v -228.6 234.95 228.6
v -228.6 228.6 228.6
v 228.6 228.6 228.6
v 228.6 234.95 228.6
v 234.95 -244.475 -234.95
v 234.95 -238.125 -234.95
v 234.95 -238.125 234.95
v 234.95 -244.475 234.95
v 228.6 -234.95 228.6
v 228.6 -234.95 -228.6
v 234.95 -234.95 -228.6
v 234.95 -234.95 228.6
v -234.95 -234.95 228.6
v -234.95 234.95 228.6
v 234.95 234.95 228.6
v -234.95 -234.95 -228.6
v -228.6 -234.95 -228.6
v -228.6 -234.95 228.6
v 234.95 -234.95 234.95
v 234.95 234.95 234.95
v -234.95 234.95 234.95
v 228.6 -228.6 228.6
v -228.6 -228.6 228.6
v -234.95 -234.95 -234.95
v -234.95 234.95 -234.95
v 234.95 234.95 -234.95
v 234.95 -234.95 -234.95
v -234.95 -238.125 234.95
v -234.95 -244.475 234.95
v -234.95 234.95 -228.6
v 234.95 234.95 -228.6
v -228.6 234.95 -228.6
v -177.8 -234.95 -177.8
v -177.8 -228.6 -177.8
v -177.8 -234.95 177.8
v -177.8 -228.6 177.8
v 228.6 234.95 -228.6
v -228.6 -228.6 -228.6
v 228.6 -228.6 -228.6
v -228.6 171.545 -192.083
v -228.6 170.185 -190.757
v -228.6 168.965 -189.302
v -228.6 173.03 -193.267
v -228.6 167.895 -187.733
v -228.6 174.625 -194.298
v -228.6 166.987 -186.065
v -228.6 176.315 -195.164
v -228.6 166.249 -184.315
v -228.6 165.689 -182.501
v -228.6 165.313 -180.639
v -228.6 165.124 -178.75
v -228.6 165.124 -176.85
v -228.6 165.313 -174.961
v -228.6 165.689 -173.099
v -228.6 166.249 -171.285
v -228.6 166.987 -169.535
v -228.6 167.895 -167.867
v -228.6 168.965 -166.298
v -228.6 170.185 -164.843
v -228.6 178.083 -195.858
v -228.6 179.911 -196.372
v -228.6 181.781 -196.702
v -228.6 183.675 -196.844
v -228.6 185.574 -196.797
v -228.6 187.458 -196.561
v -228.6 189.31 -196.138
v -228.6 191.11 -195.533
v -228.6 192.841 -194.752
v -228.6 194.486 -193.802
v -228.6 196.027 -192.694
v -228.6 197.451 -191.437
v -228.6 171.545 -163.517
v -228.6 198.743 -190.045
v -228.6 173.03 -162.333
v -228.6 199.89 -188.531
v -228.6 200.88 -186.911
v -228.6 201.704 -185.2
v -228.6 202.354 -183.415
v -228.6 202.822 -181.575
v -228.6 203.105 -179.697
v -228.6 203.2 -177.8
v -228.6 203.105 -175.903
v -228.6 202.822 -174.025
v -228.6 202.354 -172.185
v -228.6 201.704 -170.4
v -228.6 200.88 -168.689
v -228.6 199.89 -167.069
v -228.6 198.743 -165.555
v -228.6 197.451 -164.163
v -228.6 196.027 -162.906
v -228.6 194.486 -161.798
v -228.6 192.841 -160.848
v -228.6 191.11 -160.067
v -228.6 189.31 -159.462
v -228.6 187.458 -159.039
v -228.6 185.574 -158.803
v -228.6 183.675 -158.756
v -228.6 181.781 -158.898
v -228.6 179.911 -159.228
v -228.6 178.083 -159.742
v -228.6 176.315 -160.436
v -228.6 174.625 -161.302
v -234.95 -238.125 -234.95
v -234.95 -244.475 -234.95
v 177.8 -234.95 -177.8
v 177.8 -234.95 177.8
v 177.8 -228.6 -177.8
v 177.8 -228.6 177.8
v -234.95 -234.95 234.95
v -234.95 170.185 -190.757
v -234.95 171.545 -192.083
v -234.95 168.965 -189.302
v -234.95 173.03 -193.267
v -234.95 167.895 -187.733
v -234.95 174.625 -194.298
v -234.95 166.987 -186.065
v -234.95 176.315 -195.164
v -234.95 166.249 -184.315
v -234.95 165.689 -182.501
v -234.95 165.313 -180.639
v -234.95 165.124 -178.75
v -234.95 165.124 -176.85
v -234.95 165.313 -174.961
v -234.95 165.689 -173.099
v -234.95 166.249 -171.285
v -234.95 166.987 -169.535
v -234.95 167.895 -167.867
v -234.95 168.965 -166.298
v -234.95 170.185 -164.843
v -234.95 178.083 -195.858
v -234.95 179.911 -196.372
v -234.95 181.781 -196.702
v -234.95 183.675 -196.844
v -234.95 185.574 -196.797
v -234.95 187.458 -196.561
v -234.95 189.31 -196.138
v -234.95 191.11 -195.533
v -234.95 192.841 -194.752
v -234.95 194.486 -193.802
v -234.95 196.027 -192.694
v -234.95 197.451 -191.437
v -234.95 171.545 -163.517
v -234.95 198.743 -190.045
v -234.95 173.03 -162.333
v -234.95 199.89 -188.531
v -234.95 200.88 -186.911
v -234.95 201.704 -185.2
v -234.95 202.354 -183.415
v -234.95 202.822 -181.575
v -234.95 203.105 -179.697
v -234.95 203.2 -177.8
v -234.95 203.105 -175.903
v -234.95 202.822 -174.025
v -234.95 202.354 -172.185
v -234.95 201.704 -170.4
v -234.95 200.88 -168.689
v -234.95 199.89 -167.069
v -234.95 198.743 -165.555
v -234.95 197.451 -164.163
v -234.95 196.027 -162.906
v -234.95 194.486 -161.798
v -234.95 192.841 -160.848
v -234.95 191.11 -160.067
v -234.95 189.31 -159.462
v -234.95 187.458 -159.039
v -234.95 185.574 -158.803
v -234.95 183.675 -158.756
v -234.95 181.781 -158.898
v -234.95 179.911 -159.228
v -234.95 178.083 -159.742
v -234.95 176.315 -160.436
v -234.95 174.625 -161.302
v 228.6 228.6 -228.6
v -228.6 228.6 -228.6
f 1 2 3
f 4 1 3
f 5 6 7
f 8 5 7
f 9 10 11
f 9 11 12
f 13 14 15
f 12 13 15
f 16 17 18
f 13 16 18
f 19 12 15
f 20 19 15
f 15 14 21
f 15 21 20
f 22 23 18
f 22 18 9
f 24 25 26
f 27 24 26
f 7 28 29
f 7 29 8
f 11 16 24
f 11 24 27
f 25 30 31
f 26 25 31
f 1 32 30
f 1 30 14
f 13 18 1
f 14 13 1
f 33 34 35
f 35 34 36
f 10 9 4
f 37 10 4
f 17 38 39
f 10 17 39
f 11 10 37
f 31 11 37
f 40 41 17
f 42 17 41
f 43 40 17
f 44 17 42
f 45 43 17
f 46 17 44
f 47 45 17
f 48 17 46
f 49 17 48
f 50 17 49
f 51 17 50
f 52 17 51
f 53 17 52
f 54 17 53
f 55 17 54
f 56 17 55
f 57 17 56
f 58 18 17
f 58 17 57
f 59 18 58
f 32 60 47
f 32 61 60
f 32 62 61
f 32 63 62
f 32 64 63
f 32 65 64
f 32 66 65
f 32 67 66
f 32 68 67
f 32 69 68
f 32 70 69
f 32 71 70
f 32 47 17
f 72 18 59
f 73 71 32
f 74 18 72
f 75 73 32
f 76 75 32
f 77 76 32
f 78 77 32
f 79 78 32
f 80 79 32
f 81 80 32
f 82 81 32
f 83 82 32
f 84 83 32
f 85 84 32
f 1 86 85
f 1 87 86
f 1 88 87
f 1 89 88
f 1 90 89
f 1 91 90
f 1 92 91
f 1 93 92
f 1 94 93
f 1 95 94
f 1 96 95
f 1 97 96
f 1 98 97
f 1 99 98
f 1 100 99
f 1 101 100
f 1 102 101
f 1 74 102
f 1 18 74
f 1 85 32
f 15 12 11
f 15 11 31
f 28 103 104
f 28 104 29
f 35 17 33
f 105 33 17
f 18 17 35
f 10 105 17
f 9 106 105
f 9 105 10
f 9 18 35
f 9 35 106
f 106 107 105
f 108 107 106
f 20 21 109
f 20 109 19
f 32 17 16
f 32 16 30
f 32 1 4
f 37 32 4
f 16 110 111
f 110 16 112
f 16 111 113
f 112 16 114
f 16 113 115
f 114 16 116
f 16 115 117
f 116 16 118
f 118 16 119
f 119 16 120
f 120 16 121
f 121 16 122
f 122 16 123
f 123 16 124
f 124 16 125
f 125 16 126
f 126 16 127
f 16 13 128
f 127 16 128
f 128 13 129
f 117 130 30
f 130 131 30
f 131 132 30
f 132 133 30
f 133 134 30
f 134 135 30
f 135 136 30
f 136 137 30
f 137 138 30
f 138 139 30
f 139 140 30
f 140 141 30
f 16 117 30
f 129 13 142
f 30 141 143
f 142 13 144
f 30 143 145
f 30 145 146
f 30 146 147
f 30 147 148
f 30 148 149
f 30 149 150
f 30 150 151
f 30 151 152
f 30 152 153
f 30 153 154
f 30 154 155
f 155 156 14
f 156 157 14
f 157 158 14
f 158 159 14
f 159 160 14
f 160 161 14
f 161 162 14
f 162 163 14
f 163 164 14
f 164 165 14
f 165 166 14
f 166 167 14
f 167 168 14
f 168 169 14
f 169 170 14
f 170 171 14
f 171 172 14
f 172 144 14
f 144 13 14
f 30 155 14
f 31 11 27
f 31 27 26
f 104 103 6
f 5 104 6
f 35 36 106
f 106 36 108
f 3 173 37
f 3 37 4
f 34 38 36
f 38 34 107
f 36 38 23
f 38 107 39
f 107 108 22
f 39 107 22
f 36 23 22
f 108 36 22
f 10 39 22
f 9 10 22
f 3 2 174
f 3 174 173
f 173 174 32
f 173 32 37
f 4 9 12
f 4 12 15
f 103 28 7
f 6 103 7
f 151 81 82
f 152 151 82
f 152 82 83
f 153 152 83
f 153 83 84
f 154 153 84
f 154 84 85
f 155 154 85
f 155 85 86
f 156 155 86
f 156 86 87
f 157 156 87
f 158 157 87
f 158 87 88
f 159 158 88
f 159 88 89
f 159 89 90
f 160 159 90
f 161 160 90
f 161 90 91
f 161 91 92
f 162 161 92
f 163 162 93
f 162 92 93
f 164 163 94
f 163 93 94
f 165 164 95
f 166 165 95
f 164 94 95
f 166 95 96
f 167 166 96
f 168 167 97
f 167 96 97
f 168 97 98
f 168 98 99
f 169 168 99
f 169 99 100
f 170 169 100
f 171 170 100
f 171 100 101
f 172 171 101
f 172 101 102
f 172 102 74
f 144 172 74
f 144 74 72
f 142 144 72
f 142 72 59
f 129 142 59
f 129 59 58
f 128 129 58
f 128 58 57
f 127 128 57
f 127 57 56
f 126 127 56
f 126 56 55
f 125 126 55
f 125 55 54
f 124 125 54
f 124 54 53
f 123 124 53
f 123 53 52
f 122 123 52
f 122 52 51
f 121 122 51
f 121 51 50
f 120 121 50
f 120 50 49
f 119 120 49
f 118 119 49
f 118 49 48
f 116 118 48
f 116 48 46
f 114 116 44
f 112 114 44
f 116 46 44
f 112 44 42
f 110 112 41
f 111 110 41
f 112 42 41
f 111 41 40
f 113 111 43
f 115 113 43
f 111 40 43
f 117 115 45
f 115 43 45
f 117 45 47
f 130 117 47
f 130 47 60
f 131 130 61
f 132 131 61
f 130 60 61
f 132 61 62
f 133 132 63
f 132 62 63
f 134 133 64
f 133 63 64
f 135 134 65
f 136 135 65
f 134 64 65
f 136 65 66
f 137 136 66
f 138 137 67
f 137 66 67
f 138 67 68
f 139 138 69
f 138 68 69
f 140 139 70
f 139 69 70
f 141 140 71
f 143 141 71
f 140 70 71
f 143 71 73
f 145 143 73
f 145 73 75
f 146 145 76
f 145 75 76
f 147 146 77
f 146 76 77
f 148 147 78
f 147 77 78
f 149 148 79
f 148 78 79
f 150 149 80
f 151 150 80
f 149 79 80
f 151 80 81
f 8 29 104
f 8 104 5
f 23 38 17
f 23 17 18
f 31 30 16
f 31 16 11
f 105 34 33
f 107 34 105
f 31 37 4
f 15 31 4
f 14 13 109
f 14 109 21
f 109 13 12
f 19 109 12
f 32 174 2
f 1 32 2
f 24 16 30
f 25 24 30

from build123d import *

# Parameters (mm, degrees)
F12_W     = 469.9
F12_H     = 469.9
F13_DEPTH = 6.35
F9_W      = 457.2
F9_H      = 457.2
F14_DEPTH = 6.35
F10_W     = 355.6
F10_H     = 355.6
F16_DEPTH = 6.35
F8_W      = 469.9
F8_H      = 457.2
F8_R      = 19.05
F17_DEPTH = 6.35
F19_DEPTH = 9.525
F7_W      = 469.9
F7_H      = 469.9
F20_DEPTH = 6.35


with BuildPart() as f13:
    # F12 (on offset) → F13 (new body)
    with BuildSketch(Plane.XZ.offset(238.125)):
        Rectangle(F12_W, F12_H)
    extrude(amount=F13_DEPTH)


with BuildPart() as f14:
    # F9 (on offset) → F14 (new body)
    with BuildSketch(Plane.XZ.offset(-228.6)):
        Rectangle(F9_W, F9_H)
    extrude(amount=-F14_DEPTH)


with BuildPart() as f15_1:
    # F15: instance of F14
    add(f14.part.mirror(Plane.XZ))

    # F10 (on offset) → F16 (cut)
    with BuildSketch(Plane.XZ.offset(228.6)):
        Rectangle(F10_W, F10_H)
    extrude(amount=F16_DEPTH, mode=Mode.SUBTRACT)


with BuildPart() as f17:
    # F8 (on offset) → F17 (new body)
    with BuildSketch(Plane.YZ.offset(-228.6)):
        Rectangle(F8_W, F8_H)
        with Locations((184.15, -177.8)):
            Circle(F8_R, mode=Mode.SUBTRACT)
        with Locations((184.15, -177.8)):
            Circle(F8_R)
    extrude(amount=-F17_DEPTH)


with BuildPart() as f18_1:
    # F18: instance of F17
    add(f17.part.mirror(Plane.YZ))


with BuildPart() as f17_1:
    add(f17.part)

    # F8 (on offset) → F19 (cut)
    with BuildSketch(Plane.YZ.offset(-228.6)):
        with Locations((184.15, -177.8)):
            Circle(F8_R)
    extrude(amount=-F19_DEPTH, mode=Mode.SUBTRACT)


with BuildPart() as f20:
    # F7 (on offset) → F20 (new body)
    with BuildSketch(Plane.XY.offset(228.6)):
        Rectangle(F7_W, F7_H)
    extrude(amount=F20_DEPTH)


with BuildPart() as f21_1:
    # F21: instance of F20
    add(f20.part.mirror(Plane.XY))


solid = Compound([f13.part, f14.part, f15_1.part, f18_1.part, f17_1.part, f20.part, f21_1.part])
